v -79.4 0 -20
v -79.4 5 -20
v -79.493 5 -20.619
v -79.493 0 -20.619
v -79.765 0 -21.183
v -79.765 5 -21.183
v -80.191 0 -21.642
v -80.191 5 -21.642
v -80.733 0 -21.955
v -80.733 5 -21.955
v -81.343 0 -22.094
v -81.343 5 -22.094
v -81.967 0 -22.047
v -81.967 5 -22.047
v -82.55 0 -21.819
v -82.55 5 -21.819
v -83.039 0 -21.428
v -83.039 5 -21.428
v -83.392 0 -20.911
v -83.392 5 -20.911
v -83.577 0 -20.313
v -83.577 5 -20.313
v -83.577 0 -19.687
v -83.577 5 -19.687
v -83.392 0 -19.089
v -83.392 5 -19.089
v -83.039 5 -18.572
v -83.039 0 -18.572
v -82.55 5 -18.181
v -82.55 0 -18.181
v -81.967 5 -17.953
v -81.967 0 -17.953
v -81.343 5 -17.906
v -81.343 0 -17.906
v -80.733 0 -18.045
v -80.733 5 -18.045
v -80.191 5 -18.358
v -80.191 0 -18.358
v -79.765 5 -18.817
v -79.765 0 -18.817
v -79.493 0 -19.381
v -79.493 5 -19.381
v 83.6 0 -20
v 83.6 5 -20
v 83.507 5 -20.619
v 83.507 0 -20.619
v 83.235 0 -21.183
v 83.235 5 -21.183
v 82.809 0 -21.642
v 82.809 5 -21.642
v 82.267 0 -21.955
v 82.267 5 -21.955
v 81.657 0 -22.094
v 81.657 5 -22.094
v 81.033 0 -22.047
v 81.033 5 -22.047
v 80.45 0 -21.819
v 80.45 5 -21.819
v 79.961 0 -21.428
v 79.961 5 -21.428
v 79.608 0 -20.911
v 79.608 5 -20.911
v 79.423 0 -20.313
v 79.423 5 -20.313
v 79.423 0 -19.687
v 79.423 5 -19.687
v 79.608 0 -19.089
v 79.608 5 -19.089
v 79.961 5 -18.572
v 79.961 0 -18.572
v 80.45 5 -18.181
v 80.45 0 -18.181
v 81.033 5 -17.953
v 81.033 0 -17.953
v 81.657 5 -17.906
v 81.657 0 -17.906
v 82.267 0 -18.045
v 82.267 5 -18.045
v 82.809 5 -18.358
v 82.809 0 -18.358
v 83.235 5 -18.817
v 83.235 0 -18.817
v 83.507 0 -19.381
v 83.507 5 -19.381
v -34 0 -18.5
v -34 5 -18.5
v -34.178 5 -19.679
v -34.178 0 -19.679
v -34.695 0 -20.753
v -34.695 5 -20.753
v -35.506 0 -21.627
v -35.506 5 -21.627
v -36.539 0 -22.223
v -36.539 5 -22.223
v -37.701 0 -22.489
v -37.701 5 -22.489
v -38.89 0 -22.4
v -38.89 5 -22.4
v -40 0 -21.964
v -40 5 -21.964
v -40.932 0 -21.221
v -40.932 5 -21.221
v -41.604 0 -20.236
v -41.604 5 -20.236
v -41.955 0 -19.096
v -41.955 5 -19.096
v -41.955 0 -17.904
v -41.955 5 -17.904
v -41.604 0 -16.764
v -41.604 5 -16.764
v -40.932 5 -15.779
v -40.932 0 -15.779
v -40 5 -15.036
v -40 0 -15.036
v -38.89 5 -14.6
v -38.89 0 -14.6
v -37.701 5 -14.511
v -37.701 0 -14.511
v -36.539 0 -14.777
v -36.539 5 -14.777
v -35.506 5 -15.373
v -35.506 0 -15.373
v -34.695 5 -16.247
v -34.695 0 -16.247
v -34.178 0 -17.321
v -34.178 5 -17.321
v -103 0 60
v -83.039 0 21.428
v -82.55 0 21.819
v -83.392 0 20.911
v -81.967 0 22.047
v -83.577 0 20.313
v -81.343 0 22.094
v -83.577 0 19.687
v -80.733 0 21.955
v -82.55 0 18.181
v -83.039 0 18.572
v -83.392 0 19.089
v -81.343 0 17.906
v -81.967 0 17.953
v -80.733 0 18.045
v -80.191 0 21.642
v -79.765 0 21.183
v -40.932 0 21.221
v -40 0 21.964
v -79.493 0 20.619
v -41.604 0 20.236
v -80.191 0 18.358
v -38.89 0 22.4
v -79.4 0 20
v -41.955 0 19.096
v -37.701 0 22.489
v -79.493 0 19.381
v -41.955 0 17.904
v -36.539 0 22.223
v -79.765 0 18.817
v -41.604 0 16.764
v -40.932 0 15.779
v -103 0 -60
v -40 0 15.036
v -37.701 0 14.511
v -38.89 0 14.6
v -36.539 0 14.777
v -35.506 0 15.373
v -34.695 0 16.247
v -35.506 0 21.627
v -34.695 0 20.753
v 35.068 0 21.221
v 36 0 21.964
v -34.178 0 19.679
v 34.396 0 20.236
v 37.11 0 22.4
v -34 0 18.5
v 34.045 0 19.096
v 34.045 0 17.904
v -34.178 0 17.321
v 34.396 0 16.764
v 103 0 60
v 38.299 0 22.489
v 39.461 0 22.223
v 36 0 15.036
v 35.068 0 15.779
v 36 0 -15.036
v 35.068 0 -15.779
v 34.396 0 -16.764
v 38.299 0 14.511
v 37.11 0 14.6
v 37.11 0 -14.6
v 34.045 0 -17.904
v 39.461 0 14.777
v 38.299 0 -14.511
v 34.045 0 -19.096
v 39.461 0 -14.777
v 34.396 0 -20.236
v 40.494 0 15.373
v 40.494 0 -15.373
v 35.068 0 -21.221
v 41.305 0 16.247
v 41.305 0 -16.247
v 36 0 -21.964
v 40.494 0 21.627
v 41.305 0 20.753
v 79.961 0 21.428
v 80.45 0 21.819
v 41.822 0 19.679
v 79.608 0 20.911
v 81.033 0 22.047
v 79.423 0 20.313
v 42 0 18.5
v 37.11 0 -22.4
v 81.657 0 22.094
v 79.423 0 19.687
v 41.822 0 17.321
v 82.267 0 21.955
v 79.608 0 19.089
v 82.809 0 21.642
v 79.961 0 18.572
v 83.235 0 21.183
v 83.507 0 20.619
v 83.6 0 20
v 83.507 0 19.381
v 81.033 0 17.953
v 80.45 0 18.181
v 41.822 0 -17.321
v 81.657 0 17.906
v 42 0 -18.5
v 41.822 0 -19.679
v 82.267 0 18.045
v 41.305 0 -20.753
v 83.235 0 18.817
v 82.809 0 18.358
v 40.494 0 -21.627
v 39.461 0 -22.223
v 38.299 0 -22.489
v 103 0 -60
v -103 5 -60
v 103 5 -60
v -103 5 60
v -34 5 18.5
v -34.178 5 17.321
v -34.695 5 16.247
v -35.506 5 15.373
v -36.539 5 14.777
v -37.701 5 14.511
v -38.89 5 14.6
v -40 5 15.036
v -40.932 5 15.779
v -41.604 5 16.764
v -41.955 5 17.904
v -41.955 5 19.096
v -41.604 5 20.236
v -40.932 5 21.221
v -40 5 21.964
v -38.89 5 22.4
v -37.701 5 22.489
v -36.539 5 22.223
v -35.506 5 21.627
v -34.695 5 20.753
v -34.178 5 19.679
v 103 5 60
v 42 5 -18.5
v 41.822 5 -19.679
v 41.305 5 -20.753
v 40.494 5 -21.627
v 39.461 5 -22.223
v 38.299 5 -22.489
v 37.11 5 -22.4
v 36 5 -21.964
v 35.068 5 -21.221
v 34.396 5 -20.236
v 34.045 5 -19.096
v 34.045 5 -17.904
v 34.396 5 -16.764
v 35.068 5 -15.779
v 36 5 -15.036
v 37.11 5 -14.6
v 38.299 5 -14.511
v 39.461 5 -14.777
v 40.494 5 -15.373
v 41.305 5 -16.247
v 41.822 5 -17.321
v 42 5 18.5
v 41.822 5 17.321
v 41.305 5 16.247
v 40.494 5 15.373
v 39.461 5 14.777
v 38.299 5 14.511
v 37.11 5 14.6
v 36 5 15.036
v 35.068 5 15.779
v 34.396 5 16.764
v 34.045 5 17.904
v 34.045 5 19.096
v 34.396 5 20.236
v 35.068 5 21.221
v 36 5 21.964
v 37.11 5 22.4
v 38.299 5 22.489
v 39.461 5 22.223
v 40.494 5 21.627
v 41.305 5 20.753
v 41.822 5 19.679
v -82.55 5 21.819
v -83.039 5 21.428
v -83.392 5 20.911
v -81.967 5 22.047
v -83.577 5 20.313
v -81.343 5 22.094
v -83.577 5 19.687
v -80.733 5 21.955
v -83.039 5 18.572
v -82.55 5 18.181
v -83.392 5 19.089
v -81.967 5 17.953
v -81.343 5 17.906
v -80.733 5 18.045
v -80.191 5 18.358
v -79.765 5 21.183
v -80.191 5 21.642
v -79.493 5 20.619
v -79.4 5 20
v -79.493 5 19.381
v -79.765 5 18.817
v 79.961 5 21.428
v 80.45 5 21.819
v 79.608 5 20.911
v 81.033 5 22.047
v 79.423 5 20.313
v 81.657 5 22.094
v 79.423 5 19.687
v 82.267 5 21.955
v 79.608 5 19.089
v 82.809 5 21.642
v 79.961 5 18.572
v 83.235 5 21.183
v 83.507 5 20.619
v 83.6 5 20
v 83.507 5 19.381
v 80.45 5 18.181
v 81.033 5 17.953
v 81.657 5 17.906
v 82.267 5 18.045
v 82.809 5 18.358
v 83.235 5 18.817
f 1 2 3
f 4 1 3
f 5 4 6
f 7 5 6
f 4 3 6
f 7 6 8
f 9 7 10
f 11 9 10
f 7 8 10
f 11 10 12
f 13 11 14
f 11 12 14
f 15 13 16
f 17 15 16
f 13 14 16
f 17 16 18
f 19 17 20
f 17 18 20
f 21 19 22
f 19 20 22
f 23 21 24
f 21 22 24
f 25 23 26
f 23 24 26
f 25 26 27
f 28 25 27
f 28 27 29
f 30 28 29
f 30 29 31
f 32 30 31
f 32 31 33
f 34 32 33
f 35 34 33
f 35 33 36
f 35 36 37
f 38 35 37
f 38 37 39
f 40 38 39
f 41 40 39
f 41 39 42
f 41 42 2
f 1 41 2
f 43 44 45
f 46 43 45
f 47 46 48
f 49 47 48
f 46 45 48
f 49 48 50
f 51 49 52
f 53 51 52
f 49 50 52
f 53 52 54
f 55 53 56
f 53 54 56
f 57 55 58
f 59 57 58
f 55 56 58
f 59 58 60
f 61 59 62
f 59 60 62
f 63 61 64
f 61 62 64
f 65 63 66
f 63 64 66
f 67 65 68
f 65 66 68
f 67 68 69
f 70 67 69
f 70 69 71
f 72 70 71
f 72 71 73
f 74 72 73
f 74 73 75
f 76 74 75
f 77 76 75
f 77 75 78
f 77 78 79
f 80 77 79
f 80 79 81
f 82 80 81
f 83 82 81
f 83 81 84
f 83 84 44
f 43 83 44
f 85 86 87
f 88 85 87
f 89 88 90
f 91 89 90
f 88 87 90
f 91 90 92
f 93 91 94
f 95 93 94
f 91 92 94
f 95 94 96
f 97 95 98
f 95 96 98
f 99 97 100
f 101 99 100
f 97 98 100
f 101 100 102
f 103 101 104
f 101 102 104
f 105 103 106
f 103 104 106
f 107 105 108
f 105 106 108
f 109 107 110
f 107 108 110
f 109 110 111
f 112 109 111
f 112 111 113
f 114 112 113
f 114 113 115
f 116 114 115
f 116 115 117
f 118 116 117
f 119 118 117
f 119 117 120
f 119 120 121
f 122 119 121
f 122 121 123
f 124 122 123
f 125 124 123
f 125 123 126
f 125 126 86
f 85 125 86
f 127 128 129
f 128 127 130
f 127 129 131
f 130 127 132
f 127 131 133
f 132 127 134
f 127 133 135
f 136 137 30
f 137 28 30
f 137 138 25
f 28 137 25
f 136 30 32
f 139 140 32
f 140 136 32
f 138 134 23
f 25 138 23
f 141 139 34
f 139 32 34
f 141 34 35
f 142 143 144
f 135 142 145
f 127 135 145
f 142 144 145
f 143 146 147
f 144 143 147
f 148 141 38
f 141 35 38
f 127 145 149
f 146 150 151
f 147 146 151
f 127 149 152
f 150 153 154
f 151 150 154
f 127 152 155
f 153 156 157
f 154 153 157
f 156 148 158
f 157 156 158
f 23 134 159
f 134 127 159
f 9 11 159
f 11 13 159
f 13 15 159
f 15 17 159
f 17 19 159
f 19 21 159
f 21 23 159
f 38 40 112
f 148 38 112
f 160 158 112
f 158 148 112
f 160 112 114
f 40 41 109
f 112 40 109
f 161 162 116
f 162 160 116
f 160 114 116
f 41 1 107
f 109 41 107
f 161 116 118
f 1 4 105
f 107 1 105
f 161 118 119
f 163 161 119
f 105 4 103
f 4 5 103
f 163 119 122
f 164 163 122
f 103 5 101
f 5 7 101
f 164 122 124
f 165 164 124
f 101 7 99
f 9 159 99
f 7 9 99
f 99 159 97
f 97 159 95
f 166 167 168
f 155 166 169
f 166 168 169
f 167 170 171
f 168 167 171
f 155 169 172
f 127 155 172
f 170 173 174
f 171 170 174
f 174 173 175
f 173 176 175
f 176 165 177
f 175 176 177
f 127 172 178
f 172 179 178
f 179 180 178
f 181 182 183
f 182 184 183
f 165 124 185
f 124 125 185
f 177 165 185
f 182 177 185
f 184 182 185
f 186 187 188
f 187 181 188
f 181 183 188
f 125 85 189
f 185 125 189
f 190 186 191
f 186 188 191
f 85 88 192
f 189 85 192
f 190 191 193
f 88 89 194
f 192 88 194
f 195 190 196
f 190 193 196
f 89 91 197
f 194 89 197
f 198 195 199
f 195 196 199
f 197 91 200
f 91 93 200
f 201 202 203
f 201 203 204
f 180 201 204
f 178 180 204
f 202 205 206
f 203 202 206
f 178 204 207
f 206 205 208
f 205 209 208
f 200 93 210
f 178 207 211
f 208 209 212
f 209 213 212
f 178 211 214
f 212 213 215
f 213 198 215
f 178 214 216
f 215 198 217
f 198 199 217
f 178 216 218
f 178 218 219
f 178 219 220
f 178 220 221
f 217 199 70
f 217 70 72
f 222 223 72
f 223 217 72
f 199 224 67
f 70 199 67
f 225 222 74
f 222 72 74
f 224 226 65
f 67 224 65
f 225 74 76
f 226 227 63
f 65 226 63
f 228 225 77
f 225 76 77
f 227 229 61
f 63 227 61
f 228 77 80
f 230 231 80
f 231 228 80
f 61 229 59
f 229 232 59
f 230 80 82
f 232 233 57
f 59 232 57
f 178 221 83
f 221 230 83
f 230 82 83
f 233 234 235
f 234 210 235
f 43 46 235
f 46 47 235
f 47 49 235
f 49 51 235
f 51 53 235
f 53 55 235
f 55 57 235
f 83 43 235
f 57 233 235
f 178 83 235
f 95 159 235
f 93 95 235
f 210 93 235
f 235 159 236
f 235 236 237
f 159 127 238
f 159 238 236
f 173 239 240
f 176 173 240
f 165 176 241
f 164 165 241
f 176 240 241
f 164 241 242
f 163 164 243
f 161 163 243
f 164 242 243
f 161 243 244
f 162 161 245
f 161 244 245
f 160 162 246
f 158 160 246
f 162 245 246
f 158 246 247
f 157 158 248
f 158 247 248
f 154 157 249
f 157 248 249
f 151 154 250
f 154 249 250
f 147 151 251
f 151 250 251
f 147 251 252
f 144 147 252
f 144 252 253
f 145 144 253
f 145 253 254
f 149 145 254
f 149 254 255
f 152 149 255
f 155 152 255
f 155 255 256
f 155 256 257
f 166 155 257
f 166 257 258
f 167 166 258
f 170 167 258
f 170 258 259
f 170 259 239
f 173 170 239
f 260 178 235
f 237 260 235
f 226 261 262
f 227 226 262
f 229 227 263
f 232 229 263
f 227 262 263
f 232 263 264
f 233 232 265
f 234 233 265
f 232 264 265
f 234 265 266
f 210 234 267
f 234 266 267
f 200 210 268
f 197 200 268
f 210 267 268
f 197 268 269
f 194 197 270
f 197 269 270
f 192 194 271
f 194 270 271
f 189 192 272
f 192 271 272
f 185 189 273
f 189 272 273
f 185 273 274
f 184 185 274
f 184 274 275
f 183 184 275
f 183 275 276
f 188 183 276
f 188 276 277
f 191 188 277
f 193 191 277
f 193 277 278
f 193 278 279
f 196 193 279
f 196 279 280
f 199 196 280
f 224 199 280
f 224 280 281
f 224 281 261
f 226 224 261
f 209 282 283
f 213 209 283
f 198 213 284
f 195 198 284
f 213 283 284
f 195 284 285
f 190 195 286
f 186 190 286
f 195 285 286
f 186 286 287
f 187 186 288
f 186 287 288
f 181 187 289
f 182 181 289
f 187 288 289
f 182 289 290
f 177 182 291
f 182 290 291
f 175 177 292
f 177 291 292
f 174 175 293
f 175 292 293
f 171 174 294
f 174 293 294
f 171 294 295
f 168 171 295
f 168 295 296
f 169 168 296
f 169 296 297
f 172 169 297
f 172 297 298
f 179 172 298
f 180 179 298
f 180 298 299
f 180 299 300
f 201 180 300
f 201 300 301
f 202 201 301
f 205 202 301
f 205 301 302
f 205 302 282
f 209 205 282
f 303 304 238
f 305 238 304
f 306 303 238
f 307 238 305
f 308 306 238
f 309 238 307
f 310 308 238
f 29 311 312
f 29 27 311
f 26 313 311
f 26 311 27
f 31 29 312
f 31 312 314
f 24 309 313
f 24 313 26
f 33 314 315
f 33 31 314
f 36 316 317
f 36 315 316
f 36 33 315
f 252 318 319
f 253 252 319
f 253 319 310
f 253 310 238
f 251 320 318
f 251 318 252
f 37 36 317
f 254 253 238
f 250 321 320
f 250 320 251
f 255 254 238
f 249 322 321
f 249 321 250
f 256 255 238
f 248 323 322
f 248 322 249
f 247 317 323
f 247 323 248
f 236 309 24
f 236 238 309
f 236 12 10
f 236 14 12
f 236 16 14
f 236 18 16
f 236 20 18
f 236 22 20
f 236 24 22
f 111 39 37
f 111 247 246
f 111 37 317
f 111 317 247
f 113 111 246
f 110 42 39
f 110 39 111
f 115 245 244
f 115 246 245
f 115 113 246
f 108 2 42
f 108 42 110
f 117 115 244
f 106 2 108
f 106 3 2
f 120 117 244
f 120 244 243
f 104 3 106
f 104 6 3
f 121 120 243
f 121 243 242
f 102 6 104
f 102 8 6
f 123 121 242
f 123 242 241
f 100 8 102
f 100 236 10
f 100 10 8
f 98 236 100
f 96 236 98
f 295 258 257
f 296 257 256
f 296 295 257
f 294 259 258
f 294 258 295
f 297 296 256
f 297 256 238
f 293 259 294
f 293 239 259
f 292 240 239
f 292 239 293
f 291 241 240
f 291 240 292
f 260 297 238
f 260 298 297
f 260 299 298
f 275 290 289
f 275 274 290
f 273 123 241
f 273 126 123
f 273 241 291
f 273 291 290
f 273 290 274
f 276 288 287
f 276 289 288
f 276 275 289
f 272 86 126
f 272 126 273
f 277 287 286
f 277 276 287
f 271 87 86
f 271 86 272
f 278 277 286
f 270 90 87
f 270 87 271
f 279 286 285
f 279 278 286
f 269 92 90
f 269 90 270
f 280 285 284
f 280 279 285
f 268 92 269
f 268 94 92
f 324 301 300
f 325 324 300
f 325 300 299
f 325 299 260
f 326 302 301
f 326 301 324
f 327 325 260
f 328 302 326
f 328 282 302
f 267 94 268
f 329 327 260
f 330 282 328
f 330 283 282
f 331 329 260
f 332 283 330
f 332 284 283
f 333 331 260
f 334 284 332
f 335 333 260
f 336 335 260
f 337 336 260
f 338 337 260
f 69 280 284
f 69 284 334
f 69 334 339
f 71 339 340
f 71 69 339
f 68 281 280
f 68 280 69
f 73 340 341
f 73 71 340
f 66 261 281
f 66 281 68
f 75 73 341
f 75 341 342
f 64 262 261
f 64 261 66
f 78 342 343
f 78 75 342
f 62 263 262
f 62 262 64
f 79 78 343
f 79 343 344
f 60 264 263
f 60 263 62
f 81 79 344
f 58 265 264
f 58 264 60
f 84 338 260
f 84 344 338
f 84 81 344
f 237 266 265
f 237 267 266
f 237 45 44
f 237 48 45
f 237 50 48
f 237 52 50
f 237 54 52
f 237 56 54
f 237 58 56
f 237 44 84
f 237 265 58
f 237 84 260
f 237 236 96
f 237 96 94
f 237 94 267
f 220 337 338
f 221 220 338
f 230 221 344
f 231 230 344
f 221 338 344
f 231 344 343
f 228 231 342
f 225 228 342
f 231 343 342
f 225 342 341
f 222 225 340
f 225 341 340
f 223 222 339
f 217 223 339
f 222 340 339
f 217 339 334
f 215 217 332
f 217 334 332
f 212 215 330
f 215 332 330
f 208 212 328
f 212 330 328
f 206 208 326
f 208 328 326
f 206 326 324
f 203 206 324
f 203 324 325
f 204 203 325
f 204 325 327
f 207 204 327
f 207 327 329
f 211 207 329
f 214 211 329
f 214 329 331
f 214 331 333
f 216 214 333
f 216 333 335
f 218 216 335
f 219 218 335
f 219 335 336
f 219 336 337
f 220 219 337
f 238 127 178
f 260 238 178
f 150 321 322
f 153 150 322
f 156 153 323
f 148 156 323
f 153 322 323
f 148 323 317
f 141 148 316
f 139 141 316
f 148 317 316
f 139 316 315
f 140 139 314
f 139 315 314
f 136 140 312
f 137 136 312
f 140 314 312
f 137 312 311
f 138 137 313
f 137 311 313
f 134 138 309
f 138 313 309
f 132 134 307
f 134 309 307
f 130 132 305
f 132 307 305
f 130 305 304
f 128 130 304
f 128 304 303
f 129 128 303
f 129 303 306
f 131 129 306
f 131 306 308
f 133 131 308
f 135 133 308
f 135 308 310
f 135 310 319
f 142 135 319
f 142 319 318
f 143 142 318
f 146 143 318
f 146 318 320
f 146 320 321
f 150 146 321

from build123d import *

# Parameters (mm, degrees)
SKETCH_1_W          = 206
SKETCH_1_H          = 120
EXTRUDE_1_DEPTH     = 5
SKETCH_2_R          = 2.1
CUT_EXTRUDE_1_DEPTH = 6
SKETCH_3_R          = 4
CUT_EXTRUDE_2_DEPTH = 6


with BuildPart() as part:
    # 草图1 → 凸台-拉伸1 (new body)
    with BuildSketch(Plane(origin=(0, 0, 0), x_dir=(1, 0, 0), z_dir=(0, 1, 0))):
        Rectangle(SKETCH_1_W, SKETCH_1_H)
    extrude(amount=EXTRUDE_1_DEPTH)

    # 草图2 → 切除-拉伸1 (cut, through all)
    with BuildSketch(Plane(origin=(0, 5, 0), x_dir=(1, 0, 0), z_dir=(0, 1, 0))):
        with Locations((-81.5, 20)):
            Circle(SKETCH_2_R)
        with Locations((81.5, 20)):
            Circle(SKETCH_2_R)
        with Locations((81.5, -20)):
            Circle(SKETCH_2_R)
        with Locations((-81.5, -20)):
            Circle(SKETCH_2_R)
    extrude(amount=-CUT_EXTRUDE_1_DEPTH, mode=Mode.SUBTRACT)

    # 草图3 → 切除-拉伸2 (cut, through all)
    with BuildSketch(Plane(origin=(0, 5, 0), x_dir=(1, 0, 0), z_dir=(0, 1, 0))):
        with Locations((-38, 18.5)):
            Circle(SKETCH_3_R)
        with Locations((38, 18.5)):
            Circle(SKETCH_3_R)
        with Locations((38, -18.5)):
            Circle(SKETCH_3_R)
        with Locations((-38, -18.5)):
            Circle(SKETCH_3_R)
    extrude(amount=-CUT_EXTRUDE_2_DEPTH, mode=Mode.SUBTRACT)


solid = part.part
